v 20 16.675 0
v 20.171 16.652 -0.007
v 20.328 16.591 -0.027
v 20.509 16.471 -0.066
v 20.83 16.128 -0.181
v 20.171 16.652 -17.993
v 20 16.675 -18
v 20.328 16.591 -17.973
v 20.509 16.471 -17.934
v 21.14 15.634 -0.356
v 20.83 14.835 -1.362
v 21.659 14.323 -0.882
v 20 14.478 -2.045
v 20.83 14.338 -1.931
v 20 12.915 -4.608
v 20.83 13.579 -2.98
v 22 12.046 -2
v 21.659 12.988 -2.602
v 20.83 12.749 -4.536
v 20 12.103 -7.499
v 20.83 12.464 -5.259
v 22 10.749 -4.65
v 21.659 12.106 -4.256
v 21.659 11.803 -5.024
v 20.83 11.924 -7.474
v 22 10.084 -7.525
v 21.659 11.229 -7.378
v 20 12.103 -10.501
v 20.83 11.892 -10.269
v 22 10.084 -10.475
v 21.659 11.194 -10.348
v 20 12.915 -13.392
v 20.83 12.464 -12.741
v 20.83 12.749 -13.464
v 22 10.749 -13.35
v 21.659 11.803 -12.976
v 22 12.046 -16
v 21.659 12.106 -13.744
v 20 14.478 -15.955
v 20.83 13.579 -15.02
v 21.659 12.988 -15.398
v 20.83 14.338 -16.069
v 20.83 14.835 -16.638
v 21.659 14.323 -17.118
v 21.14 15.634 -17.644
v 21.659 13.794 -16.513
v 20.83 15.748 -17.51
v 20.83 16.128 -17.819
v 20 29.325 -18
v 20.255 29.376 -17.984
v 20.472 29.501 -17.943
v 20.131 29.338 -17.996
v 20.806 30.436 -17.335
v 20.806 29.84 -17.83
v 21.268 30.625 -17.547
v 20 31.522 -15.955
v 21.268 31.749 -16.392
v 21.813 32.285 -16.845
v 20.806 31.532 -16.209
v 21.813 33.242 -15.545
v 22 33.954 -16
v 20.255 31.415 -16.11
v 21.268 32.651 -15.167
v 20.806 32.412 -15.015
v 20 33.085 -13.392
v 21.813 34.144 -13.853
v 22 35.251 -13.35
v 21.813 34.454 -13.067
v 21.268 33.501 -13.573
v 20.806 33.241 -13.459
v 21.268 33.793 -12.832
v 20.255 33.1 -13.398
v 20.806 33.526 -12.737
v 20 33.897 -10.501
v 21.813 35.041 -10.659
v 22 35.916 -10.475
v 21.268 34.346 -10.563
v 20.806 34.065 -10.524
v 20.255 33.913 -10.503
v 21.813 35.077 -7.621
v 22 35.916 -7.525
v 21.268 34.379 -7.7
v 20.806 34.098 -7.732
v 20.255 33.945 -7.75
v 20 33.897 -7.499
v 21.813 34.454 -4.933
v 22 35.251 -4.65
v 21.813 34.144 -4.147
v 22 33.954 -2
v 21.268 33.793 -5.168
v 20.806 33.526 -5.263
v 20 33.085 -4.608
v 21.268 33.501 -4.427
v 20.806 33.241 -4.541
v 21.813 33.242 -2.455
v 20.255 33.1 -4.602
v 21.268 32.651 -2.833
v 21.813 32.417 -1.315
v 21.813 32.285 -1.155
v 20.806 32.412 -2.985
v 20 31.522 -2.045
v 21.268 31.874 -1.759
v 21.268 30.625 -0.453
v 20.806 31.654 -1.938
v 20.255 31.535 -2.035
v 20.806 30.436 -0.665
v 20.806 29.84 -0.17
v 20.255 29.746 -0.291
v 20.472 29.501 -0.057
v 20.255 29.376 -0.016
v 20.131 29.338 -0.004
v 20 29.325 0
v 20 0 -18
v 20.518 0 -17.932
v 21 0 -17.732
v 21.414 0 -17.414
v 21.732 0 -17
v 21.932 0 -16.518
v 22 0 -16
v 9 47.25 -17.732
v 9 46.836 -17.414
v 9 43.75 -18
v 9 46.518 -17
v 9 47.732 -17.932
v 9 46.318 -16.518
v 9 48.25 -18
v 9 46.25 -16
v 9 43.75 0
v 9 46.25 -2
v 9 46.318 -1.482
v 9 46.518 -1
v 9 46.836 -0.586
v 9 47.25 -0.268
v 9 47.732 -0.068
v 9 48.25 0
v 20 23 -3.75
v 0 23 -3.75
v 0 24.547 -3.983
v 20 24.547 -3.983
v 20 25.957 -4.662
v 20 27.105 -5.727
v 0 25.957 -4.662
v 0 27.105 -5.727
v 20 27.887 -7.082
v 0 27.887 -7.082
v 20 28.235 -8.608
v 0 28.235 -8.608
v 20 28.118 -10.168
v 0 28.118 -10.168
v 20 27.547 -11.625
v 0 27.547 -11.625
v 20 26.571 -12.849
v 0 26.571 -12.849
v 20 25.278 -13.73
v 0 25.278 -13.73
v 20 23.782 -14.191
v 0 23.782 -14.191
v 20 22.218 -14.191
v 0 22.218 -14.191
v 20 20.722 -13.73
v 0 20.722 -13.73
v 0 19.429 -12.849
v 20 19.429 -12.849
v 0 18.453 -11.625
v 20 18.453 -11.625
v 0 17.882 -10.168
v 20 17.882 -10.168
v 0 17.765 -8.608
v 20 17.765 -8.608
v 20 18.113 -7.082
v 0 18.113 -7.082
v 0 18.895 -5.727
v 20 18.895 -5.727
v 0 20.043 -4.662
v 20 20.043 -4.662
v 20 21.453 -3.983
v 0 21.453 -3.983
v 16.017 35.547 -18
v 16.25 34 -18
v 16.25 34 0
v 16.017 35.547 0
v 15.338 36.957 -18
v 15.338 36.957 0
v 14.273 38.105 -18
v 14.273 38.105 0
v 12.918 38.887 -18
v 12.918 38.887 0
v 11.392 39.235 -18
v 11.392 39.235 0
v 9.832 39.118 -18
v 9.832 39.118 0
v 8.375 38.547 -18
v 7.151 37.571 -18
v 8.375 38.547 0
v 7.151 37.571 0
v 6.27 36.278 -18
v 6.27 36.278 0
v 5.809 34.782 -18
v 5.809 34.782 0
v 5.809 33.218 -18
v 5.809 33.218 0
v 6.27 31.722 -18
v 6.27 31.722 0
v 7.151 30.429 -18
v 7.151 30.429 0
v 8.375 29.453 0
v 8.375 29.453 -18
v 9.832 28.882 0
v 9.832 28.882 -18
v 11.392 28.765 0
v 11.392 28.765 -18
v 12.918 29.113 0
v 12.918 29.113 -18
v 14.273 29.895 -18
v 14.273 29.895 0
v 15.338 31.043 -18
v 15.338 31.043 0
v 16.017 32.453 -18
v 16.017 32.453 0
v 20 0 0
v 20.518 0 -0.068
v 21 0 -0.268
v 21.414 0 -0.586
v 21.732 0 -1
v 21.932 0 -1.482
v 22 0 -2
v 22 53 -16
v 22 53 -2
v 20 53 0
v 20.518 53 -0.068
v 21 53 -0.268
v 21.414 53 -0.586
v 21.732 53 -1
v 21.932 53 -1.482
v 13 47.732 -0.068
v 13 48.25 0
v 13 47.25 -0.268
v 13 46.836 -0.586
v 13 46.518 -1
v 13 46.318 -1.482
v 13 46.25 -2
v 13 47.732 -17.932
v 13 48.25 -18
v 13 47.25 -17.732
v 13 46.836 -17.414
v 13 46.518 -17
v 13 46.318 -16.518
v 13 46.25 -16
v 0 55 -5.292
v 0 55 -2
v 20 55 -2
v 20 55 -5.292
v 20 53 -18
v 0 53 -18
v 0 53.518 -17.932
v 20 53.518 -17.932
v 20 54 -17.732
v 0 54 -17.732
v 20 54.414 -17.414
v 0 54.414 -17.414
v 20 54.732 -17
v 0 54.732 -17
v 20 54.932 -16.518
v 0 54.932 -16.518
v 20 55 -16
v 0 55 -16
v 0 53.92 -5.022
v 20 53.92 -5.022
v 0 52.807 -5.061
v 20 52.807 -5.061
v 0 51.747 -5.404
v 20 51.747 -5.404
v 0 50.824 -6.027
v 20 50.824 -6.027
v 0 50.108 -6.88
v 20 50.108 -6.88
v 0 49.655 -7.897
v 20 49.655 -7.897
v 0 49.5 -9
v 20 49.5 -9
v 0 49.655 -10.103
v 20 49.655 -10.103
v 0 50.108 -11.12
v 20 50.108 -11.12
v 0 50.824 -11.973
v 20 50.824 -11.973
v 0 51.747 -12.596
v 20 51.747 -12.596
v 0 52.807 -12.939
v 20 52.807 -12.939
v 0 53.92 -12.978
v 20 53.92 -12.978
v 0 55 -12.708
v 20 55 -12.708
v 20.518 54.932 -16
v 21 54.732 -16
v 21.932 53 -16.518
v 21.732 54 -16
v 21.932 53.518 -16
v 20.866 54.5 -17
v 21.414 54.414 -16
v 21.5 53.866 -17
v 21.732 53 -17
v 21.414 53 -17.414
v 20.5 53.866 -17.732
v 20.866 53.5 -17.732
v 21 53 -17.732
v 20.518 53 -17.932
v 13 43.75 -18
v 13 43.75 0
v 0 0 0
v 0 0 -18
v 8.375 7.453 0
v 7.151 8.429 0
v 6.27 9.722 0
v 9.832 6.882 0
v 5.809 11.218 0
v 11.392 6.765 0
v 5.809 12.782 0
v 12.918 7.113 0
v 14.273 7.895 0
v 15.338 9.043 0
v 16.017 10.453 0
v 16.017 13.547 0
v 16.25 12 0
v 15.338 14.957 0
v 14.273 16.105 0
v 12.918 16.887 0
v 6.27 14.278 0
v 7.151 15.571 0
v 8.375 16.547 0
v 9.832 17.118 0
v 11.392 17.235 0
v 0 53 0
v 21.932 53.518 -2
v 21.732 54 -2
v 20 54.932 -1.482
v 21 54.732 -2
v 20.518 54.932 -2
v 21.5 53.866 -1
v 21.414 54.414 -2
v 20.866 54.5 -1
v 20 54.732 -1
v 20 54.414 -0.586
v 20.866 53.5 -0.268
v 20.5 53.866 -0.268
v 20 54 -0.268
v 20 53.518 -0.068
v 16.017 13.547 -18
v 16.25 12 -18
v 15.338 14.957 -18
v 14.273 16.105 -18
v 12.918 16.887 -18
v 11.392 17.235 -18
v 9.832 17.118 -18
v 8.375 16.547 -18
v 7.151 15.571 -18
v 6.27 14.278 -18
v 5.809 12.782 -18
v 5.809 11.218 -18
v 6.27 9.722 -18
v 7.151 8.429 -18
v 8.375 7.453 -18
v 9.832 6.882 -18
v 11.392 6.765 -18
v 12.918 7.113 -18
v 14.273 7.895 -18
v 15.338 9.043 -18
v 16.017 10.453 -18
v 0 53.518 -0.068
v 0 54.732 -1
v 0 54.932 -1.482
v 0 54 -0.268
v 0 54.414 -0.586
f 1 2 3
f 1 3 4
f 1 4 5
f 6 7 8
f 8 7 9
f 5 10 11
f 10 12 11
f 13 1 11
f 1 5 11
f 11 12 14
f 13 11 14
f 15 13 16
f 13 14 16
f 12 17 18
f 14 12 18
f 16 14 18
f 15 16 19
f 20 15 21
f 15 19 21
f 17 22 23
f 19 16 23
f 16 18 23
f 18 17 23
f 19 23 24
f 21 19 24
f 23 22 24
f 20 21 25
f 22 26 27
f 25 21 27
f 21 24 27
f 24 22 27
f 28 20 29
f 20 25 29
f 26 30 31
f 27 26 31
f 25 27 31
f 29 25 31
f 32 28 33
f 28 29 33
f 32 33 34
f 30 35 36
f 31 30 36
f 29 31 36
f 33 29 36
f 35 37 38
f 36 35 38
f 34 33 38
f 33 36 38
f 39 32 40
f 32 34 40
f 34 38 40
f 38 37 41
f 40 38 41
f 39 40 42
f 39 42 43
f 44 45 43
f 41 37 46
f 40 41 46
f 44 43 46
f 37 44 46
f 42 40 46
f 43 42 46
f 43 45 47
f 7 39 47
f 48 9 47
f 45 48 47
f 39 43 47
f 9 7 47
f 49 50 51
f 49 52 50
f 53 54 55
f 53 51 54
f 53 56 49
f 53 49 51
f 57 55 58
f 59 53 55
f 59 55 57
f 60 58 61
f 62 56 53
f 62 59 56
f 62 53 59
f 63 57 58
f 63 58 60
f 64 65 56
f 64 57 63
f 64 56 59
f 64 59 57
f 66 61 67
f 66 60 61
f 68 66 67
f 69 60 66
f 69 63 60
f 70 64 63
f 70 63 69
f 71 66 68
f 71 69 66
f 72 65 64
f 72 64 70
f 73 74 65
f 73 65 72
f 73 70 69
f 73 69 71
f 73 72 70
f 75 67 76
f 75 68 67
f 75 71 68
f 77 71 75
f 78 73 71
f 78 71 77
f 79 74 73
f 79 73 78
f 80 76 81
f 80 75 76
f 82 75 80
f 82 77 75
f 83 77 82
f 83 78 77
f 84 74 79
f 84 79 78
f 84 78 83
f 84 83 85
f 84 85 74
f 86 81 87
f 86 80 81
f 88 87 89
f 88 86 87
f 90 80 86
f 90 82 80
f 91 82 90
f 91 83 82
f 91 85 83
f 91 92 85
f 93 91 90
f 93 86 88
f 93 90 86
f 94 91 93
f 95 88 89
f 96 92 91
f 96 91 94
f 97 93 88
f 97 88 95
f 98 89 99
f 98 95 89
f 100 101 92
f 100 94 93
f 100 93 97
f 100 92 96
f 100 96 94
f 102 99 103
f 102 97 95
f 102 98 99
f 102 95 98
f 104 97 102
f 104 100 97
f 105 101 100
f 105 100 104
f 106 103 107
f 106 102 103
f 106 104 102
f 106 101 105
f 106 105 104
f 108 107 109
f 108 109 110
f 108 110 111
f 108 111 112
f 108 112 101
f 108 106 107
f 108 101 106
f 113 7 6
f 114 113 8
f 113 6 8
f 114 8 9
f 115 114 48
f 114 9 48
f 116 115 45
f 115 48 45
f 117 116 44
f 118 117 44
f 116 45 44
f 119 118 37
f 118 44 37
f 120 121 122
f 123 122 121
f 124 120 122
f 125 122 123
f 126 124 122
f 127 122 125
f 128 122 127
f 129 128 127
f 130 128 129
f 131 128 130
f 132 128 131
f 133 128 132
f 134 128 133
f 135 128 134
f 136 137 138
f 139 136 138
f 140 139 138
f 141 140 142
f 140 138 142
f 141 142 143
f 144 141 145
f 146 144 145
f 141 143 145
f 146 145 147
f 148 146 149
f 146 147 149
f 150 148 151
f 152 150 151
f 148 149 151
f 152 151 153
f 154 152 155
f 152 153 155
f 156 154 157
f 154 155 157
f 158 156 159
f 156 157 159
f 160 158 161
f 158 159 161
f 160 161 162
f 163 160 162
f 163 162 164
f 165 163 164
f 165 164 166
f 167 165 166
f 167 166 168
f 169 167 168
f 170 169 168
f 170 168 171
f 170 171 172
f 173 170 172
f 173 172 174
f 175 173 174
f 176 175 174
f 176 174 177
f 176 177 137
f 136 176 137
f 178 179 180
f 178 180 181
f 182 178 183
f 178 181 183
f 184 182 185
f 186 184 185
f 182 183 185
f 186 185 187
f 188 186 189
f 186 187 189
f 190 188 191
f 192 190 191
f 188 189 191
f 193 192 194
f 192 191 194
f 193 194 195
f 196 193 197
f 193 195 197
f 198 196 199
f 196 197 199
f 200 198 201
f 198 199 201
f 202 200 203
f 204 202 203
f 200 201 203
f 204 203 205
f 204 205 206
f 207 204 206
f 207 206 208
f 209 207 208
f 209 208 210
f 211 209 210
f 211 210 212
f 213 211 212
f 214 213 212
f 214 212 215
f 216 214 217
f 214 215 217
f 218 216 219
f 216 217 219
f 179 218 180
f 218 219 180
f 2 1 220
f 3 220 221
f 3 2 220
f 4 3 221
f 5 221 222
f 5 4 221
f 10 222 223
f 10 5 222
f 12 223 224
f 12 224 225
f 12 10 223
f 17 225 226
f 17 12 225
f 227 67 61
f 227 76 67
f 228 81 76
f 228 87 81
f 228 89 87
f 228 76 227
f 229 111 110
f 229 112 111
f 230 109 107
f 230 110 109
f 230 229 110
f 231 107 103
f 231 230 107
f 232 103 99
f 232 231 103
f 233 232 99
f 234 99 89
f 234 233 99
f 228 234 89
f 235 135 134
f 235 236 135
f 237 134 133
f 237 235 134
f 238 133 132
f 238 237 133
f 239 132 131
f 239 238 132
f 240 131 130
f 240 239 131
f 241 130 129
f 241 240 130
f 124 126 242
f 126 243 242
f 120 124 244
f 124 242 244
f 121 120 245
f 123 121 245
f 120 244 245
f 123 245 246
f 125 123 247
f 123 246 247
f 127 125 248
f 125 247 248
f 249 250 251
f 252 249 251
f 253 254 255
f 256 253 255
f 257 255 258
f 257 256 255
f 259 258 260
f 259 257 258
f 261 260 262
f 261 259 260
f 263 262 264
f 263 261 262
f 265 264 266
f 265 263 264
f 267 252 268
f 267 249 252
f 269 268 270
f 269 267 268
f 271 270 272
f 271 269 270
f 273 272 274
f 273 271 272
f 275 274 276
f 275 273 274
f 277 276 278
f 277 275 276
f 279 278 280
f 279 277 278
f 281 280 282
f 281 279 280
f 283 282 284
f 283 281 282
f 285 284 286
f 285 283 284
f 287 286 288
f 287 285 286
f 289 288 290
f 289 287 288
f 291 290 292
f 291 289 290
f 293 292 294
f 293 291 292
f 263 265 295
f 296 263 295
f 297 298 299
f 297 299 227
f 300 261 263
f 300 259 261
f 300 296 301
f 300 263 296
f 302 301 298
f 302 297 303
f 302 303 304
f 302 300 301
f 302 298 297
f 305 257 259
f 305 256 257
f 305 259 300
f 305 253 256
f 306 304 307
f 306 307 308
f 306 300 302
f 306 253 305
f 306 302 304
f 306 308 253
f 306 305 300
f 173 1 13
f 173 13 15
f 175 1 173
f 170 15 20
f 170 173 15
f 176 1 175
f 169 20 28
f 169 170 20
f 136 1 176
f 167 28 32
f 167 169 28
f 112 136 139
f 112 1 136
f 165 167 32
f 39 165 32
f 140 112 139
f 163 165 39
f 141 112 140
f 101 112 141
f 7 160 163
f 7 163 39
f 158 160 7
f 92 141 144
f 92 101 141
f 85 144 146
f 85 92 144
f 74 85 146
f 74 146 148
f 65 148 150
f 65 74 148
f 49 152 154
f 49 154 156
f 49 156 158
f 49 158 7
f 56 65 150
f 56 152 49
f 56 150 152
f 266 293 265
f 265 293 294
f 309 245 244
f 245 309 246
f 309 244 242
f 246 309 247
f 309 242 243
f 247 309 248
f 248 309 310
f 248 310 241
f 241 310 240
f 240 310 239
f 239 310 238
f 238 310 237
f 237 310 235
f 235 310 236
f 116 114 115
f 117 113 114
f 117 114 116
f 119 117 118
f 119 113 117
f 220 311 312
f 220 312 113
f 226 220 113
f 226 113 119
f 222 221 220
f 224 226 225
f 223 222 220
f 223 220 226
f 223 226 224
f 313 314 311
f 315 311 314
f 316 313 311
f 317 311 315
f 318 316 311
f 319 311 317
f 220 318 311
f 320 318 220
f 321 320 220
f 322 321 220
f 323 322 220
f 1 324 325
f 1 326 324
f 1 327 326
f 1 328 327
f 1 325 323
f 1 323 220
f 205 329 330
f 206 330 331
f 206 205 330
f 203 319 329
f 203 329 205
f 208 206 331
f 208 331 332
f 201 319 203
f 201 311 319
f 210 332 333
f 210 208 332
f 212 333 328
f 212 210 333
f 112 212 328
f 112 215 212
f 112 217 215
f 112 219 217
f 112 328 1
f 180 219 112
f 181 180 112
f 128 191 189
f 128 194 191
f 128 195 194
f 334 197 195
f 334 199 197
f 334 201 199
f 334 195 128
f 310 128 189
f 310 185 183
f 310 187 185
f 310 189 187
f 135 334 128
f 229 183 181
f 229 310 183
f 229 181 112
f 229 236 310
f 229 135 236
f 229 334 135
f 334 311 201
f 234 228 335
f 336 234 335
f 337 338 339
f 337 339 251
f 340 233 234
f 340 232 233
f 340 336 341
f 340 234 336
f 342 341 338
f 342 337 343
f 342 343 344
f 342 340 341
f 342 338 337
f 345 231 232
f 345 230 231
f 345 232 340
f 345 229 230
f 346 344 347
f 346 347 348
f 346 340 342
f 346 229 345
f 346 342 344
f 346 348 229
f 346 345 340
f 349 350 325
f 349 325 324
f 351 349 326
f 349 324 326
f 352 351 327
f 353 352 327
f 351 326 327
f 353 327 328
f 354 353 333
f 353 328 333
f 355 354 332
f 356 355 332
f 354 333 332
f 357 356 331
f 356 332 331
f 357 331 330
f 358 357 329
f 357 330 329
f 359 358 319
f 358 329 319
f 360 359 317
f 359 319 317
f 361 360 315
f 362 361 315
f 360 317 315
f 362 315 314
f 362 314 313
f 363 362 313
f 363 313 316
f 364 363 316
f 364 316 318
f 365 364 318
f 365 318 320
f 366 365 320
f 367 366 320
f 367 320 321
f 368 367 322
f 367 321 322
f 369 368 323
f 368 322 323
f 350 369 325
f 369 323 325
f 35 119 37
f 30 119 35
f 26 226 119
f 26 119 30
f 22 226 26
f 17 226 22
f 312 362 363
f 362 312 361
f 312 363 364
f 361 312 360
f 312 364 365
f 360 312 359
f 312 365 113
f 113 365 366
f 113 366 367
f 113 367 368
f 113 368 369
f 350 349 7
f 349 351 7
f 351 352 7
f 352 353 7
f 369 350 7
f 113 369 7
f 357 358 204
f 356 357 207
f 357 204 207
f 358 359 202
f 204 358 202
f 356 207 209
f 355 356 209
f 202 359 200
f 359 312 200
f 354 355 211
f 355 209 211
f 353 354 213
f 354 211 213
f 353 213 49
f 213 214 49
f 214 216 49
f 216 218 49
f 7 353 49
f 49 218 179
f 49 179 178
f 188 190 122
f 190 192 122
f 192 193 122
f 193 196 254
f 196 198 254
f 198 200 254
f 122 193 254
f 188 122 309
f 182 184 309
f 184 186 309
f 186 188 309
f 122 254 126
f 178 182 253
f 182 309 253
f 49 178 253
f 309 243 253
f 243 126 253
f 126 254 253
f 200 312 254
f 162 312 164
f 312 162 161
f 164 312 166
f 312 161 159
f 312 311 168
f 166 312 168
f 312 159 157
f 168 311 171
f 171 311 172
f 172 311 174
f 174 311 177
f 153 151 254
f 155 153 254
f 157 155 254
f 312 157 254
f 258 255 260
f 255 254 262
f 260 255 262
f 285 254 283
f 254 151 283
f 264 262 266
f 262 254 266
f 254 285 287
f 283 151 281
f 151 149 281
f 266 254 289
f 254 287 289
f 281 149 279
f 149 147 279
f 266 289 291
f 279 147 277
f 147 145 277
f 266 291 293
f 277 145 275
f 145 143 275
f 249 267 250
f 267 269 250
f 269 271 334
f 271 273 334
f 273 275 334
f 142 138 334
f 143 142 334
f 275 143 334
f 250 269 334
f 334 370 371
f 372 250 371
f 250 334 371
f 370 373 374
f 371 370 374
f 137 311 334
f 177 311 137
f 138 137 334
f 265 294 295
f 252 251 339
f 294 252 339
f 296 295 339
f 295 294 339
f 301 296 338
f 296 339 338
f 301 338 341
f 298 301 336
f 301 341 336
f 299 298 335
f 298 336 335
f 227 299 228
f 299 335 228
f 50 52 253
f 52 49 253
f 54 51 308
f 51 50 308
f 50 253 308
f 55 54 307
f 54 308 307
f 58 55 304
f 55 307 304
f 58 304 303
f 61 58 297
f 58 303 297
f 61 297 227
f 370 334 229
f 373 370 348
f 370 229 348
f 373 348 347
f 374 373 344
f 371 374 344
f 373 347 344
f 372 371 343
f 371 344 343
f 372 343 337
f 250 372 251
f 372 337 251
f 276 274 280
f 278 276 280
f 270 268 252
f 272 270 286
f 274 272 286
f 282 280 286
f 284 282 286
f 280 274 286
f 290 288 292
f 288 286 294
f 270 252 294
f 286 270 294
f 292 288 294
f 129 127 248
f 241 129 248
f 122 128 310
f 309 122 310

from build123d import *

# Parameters (mm, degrees)
SKETCH1_W           = 22
SKETCH1_H           = 55
SKETCH1_R           = 5.25
SKETCH1_W_2         = 4
SKETCH1_H_2         = 2.5
BOSS_EXTRUDE1_DEPTH = 18
SKETCH2_R           = 5.25
CUT_EXTRUDE1_DEPTH  = 62.911226769
SKETCH3_R           = 4
CUT_EXTRUDE2_DEPTH  = 20
SKETCH4_R           = 11
CUT_EXTRUDE3_DEPTH  = 2
FILLET3_R           = 2
FILLET2_R           = 2
FILLET4_R           = 2


# Some blends are built 0.0001 mm under size
with BuildPart() as part:
    # Sketch1 → Boss-Extrude1 (new body)
    with BuildSketch(Plane.XY):
        with Locations((11, 27.5)):
            Rectangle(SKETCH1_W, SKETCH1_H)
        with Locations((11, 12)):
            Circle(SKETCH1_R, mode=Mode.SUBTRACT)
        with Locations((11, 34)):
            Circle(SKETCH1_R, mode=Mode.SUBTRACT)
        with Locations((11, 45)):
            Rectangle(SKETCH1_W_2, SKETCH1_H_2, mode=Mode.SUBTRACT)
    extrude(amount=-BOSS_EXTRUDE1_DEPTH)

    # Sketch2 → Cut-Extrude1 (cut, through all)
    with BuildSketch(Plane.ZY):
        with Locations((-9, 23)):
            Circle(SKETCH2_R)
    extrude(amount=-CUT_EXTRUDE1_DEPTH, mode=Mode.SUBTRACT)

    # Sketch3 → Cut-Extrude2 (cut)
    with BuildSketch(Plane(origin=(0, 0, 0), x_dir=(0, 0, -1), z_dir=(1, 0, 0))):
        with Locations((9, 53.5)):
            Circle(SKETCH3_R)
    extrude(amount=CUT_EXTRUDE2_DEPTH, mode=Mode.SUBTRACT)

    # Sketch4 → Cut-Extrude3 (cut)
    with BuildSketch(Plane(origin=(22, 0, 0), x_dir=(0, 0, -1), z_dir=(1, 0, 0))):
        with Locations((9, 23)):
            Circle(SKETCH4_R)
    extrude(amount=-CUT_EXTRUDE3_DEPTH, mode=Mode.SUBTRACT)

    # Fillet3
    fillet3_edges = [part.edges().sort_by_distance(p)[0] for p in [
        (22, 12, -9),
        (22, 34, -9),
        (22, 8.33772234, -18),
        (22, 8.33772234, 0),
        (22, 42.16227766, -18),
        (22, 42.16227766, 0),
        (11, 55, -18),
        (11, 55, 0),
    ]]
    fillet(fillet3_edges, radius=FILLET3_R - 0.0001)  # a hair under: the kernel refuses the full size

    # Fillet2
    fillet2_edges = [part.edges().sort_by_distance(p)[0] for p in [
        (11, 46.25, -18),
        (11, 46.25, 0),
    ]]
    fillet(fillet2_edges, radius=FILLET2_R)

    # Fillet4
    # the kernel refuses this fillet: 2 mm, written as the material it takes off along each edge
    with BuildSketch(Plane(origin=(20, 53, -18), x_dir=(0, 1, 0), z_dir=(-1, 0, 0))) as fillet4_piece_1:
        with BuildLine():
            CenterArc((0.0001, -1.9999), 1.9999, 0, 90)
            Line((2, -1.9999), (2, 0))
            Line((2, 0), (0.0001, 0))
        make_face()
    revolve(axis=Axis((20, 53, -18), (0, 0, -1)), revolution_arc=90, mode=Mode.SUBTRACT)
    with BuildSketch(Plane(origin=(20, 53, 0), x_dir=(1, 0, 0), z_dir=(0, -1, 0))) as fillet4_piece_2:
        with BuildLine():
            CenterArc((0.0001, -1.9999), 1.9999, 0, 90)
            Line((2, -1.9999), (2, 0))
            Line((2, 0), (0.0001, 0))
        make_face()
    revolve(axis=Axis((20, 53, 0), (0, 0, 1)), revolution_arc=90, mode=Mode.SUBTRACT)
    with BuildSketch(Plane(origin=(22, 55, 0), x_dir=(0, -1, 0), z_dir=(0, 0, -1))) as fillet4_piece_3:
        with BuildLine():
            CenterArc((FILLET4_R, FILLET4_R), FILLET4_R, 180, 90)
            Line((0, FILLET4_R), (0, 0))
            Line((0, 0), (FILLET4_R, 0))
        make_face()
    extrude(amount=18, mode=Mode.SUBTRACT)


solid = part.part
